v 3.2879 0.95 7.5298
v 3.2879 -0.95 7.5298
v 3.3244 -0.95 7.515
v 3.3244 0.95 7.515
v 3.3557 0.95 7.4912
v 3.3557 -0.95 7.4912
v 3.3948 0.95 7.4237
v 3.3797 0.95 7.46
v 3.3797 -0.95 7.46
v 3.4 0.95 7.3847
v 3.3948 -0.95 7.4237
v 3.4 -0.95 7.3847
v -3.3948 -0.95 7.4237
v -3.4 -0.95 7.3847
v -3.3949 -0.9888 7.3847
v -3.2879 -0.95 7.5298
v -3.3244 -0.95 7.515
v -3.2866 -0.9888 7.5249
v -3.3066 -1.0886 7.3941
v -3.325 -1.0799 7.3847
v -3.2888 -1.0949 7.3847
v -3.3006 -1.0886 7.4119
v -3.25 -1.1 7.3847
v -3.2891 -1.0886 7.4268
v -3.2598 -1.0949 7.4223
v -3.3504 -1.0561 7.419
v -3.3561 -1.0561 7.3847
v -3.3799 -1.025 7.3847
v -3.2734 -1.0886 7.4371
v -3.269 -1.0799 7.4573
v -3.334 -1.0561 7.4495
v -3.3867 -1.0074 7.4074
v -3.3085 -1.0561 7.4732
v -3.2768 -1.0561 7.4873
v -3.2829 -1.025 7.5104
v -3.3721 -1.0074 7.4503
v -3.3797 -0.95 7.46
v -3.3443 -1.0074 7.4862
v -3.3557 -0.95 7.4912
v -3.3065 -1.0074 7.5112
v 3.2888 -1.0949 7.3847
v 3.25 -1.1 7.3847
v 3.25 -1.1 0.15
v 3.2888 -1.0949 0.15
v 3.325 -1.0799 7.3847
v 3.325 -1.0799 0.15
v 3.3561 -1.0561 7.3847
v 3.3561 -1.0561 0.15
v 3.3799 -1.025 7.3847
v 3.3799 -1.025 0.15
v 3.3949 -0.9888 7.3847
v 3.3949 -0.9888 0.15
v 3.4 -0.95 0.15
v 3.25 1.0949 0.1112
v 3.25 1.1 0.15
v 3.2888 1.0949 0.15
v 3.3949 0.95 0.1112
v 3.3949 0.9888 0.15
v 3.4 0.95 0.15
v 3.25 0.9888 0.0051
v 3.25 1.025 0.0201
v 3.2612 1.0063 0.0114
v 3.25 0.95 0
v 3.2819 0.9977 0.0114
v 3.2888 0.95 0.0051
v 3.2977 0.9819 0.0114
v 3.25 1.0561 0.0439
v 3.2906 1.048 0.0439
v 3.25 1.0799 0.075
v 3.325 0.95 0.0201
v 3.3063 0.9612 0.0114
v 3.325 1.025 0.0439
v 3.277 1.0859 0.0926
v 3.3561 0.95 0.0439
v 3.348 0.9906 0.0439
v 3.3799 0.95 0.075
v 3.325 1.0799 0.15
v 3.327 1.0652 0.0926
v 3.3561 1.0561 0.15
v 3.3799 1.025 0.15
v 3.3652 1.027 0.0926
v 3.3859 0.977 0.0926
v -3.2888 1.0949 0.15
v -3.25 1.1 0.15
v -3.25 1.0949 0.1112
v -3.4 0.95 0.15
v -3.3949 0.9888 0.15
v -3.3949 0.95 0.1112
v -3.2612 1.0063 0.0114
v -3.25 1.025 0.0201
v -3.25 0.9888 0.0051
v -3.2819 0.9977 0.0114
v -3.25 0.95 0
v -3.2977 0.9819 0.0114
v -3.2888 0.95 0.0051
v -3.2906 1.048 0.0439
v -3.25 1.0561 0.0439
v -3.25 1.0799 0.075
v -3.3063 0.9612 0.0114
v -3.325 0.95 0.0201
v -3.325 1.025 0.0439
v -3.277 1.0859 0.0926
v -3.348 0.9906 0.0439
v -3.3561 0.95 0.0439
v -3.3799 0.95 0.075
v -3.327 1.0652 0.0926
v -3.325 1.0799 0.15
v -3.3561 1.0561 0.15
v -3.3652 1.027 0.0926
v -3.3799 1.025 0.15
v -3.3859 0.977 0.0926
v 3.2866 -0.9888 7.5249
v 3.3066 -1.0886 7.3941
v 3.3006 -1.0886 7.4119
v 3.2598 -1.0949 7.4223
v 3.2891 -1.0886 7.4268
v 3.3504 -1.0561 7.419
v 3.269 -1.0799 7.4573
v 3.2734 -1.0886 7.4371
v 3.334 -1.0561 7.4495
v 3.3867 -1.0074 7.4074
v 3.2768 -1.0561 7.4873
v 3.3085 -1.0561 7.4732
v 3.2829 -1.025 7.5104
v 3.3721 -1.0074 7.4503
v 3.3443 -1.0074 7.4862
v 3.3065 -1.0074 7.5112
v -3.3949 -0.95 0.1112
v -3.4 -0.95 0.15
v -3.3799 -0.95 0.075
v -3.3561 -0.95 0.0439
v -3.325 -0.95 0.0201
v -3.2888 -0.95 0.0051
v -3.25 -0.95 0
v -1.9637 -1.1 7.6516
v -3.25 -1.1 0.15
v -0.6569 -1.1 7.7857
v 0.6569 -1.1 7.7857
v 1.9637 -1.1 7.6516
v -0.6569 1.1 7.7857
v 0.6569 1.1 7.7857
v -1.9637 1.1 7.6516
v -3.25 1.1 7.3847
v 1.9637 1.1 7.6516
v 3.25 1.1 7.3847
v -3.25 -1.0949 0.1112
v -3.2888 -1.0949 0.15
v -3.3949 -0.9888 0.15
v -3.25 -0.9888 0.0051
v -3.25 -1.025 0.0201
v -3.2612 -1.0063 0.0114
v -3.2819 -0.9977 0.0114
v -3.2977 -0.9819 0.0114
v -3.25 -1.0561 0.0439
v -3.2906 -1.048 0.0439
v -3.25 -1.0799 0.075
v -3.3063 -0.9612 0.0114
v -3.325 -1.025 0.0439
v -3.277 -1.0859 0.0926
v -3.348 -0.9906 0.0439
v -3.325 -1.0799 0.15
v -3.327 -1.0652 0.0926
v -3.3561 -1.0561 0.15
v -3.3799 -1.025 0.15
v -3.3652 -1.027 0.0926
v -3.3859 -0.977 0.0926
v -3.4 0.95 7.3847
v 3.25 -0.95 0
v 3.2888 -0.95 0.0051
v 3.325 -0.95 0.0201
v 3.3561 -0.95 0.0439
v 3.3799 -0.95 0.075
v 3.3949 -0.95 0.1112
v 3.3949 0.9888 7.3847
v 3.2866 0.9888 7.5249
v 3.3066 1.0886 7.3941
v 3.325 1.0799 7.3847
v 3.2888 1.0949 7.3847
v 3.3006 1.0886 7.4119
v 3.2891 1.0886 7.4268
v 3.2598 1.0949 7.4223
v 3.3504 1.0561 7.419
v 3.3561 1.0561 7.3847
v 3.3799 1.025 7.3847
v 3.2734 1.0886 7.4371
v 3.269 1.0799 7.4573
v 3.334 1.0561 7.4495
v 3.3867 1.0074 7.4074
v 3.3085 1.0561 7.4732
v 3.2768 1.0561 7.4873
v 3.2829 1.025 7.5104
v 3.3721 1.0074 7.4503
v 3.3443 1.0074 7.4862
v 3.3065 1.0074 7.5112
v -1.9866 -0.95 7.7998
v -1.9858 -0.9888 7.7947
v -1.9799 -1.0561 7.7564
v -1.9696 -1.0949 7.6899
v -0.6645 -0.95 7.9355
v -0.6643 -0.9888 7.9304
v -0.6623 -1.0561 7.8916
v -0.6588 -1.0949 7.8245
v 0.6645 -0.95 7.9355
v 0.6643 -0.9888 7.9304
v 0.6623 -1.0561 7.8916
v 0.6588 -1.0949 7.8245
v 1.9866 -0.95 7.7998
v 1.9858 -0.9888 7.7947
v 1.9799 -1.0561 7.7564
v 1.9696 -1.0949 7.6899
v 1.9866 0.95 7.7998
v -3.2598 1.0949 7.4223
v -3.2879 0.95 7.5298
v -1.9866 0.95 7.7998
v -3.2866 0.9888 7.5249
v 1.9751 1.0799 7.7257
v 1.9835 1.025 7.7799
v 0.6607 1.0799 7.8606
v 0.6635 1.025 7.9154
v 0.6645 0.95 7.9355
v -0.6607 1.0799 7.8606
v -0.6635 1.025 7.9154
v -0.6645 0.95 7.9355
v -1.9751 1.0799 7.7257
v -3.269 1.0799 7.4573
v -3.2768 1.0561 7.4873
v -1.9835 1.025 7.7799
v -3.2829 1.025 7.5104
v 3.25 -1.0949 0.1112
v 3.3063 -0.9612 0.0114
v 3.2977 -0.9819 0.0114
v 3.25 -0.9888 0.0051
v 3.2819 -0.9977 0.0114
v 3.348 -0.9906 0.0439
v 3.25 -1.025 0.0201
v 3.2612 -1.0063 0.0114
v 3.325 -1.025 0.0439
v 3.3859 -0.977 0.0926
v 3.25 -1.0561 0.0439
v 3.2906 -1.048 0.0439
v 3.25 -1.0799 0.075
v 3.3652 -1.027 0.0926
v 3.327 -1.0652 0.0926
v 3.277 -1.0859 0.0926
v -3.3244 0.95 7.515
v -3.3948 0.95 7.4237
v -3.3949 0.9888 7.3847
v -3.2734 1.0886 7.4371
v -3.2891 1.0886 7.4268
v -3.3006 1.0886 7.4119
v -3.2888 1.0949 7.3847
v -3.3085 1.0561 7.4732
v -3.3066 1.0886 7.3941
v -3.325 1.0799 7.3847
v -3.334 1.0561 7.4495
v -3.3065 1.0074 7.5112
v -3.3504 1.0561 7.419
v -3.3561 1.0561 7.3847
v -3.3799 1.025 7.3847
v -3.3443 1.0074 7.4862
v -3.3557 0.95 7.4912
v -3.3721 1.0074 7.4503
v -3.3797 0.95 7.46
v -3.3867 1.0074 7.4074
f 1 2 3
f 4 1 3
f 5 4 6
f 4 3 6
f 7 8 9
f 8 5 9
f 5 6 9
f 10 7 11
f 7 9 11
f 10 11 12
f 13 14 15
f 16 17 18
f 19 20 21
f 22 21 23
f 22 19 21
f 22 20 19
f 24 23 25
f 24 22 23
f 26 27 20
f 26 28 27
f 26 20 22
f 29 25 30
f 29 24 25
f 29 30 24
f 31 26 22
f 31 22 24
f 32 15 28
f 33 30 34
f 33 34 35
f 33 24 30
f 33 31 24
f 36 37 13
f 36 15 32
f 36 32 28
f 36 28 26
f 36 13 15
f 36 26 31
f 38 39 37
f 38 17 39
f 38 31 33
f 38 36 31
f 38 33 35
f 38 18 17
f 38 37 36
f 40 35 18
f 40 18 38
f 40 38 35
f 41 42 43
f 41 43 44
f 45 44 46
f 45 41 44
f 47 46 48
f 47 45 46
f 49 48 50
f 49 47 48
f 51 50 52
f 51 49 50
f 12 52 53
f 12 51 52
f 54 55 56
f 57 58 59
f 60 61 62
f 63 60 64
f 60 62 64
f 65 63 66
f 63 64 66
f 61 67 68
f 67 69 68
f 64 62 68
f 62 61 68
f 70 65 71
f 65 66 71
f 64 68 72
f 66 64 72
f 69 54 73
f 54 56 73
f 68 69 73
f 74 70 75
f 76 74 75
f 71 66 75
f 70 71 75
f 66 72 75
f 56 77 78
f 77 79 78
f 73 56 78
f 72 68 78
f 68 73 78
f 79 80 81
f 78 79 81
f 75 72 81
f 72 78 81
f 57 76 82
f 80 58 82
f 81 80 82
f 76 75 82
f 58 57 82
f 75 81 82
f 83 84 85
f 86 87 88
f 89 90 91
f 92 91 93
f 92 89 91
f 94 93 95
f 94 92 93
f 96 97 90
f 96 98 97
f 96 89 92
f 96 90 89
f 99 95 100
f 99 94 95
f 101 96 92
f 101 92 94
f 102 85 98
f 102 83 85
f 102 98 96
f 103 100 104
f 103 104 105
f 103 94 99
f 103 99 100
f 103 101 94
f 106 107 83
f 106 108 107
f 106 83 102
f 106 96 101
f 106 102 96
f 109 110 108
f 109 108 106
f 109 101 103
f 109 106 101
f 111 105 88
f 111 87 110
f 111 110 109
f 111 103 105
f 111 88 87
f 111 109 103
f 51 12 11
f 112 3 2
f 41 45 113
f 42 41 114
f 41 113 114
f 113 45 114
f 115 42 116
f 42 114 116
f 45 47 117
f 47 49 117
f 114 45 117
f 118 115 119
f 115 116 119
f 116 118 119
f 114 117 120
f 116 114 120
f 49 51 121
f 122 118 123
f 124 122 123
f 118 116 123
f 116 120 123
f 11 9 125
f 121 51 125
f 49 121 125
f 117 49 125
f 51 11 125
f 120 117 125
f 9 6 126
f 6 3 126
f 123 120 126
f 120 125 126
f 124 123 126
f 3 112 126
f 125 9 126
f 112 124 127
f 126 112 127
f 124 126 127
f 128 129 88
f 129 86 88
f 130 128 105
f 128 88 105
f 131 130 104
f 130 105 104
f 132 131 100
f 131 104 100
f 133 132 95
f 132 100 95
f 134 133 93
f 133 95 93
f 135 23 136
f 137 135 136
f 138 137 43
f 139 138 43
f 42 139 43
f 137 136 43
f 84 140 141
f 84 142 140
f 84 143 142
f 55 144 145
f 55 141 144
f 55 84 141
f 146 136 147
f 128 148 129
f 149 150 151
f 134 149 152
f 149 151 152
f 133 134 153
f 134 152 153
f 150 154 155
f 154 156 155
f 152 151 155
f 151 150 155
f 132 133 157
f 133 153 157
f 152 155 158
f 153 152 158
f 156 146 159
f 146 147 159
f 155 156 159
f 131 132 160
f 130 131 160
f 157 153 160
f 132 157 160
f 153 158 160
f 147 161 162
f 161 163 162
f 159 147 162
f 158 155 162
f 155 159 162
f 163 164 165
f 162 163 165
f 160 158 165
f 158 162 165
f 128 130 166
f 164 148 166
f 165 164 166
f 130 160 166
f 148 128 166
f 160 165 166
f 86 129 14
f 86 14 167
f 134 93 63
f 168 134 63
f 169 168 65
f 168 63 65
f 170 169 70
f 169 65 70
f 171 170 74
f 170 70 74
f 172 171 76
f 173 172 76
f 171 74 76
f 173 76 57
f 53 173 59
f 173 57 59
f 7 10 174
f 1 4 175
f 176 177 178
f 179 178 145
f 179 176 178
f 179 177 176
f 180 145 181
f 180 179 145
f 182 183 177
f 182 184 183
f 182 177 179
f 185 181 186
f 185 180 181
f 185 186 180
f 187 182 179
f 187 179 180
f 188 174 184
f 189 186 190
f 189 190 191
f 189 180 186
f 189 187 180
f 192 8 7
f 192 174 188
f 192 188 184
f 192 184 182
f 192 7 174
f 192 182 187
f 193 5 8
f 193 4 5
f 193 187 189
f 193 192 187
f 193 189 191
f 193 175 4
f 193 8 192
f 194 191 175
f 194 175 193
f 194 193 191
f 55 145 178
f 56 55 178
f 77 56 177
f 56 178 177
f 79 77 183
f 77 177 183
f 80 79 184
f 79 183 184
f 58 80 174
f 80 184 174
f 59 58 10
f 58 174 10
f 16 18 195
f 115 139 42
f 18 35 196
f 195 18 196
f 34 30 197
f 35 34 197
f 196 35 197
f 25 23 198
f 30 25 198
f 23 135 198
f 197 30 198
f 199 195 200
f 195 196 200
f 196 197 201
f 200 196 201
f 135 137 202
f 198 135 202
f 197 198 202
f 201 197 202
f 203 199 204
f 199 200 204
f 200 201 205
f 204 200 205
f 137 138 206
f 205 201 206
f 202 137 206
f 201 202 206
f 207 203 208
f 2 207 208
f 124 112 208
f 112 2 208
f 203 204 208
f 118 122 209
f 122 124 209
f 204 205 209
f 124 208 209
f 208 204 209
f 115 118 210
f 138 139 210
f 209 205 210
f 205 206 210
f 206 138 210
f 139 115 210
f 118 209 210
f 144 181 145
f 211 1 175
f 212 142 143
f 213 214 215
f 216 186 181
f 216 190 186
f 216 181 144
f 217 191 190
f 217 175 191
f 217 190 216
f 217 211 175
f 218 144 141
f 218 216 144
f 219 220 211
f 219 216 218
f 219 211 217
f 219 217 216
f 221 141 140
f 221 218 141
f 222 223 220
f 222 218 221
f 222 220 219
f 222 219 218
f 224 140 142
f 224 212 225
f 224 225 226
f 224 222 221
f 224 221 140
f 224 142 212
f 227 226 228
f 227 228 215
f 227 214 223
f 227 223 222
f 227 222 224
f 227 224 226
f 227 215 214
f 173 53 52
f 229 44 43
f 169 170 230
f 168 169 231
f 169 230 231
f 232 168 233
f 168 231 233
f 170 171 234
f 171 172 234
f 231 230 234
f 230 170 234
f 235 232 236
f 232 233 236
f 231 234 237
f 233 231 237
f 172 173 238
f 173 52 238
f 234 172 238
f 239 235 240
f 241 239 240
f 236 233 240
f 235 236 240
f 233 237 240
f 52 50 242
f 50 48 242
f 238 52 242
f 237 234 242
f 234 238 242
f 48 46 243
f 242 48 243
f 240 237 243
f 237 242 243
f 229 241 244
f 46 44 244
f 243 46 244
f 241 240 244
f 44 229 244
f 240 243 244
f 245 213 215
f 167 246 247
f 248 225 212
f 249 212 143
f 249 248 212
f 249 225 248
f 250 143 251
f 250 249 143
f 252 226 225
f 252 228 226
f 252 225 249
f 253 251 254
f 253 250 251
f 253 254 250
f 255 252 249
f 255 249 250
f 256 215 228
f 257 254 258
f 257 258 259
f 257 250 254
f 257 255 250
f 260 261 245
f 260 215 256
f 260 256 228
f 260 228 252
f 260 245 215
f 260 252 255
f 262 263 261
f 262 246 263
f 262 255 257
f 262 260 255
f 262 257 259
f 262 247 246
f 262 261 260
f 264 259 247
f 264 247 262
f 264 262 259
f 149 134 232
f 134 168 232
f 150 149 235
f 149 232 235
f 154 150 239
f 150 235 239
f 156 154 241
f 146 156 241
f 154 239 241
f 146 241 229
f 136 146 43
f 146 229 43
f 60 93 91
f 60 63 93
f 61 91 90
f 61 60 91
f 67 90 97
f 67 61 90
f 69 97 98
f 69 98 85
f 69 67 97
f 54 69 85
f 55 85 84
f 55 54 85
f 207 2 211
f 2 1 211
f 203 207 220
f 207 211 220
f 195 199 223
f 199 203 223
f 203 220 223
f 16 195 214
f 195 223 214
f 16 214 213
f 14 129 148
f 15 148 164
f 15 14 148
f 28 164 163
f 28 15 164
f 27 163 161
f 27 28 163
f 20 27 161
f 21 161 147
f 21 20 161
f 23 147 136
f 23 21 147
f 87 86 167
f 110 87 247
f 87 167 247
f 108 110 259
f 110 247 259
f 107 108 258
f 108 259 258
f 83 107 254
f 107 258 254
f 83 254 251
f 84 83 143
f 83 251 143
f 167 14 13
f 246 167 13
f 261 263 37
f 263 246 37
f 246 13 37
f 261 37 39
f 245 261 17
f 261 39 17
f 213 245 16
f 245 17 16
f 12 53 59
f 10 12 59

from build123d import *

# Parameters (mm, degrees)
SKETCH1_W           = 6.8
SKETCH1_H           = 2.2
BOSS_EXTRUDE1_DEPTH = 8
CUT_EXTRUDE1_DEPTH  = 8
FILLET1_R           = 0.15


with BuildPart() as part:
    # Sketch1 → Boss-Extrude1 (new body)
    with BuildSketch(Plane.XY):
        Rectangle(SKETCH1_W, SKETCH1_H)
    extrude(amount=BOSS_EXTRUDE1_DEPTH)

    # Sketch2 → Cut-Extrude1 (cut)
    with BuildSketch(Plane(origin=(0, 1.1, 0), x_dir=(1, 0, 0), z_dir=(0, 1, 0))):
        with BuildLine():
            Line((-3.4, -7.5), (-4.338442441, -8.7499714))
            Line((-4.338442441, -8.7499714), (5.303990533, -8.971786502))
            Line((5.303990533, -8.971786502), (3.4, -7.5))
            ThreePointArc((3.4, -7.5), (0, -7.952490287), (-3.4, -7.5))
        make_face()
    extrude(amount=-CUT_EXTRUDE1_DEPTH, mode=Mode.SUBTRACT)

    # Fillet1
    fillet1_edges = [part.edges().sort_by_distance(p)[0] for p in [
        (-3.4, 1.1, 3.75),
        (3.4, 1.1, 3.75),
        (3.4, -1.1, 3.75),
        (-3.4, -1.1, 3.75),
        (0, -1.1, 7.952490287),
        (-3.4, 0, 7.5),
        (0, 1.1, 7.952490287),
        (3.4, 0, 7.5),
        (0, 1.1, 0),
        (3.4, 0, 0),
        (0, -1.1, 0),
        (-3.4, 0, 0),
    ]]
    fillet(fillet1_edges, radius=FILLET1_R)


solid = part.part
